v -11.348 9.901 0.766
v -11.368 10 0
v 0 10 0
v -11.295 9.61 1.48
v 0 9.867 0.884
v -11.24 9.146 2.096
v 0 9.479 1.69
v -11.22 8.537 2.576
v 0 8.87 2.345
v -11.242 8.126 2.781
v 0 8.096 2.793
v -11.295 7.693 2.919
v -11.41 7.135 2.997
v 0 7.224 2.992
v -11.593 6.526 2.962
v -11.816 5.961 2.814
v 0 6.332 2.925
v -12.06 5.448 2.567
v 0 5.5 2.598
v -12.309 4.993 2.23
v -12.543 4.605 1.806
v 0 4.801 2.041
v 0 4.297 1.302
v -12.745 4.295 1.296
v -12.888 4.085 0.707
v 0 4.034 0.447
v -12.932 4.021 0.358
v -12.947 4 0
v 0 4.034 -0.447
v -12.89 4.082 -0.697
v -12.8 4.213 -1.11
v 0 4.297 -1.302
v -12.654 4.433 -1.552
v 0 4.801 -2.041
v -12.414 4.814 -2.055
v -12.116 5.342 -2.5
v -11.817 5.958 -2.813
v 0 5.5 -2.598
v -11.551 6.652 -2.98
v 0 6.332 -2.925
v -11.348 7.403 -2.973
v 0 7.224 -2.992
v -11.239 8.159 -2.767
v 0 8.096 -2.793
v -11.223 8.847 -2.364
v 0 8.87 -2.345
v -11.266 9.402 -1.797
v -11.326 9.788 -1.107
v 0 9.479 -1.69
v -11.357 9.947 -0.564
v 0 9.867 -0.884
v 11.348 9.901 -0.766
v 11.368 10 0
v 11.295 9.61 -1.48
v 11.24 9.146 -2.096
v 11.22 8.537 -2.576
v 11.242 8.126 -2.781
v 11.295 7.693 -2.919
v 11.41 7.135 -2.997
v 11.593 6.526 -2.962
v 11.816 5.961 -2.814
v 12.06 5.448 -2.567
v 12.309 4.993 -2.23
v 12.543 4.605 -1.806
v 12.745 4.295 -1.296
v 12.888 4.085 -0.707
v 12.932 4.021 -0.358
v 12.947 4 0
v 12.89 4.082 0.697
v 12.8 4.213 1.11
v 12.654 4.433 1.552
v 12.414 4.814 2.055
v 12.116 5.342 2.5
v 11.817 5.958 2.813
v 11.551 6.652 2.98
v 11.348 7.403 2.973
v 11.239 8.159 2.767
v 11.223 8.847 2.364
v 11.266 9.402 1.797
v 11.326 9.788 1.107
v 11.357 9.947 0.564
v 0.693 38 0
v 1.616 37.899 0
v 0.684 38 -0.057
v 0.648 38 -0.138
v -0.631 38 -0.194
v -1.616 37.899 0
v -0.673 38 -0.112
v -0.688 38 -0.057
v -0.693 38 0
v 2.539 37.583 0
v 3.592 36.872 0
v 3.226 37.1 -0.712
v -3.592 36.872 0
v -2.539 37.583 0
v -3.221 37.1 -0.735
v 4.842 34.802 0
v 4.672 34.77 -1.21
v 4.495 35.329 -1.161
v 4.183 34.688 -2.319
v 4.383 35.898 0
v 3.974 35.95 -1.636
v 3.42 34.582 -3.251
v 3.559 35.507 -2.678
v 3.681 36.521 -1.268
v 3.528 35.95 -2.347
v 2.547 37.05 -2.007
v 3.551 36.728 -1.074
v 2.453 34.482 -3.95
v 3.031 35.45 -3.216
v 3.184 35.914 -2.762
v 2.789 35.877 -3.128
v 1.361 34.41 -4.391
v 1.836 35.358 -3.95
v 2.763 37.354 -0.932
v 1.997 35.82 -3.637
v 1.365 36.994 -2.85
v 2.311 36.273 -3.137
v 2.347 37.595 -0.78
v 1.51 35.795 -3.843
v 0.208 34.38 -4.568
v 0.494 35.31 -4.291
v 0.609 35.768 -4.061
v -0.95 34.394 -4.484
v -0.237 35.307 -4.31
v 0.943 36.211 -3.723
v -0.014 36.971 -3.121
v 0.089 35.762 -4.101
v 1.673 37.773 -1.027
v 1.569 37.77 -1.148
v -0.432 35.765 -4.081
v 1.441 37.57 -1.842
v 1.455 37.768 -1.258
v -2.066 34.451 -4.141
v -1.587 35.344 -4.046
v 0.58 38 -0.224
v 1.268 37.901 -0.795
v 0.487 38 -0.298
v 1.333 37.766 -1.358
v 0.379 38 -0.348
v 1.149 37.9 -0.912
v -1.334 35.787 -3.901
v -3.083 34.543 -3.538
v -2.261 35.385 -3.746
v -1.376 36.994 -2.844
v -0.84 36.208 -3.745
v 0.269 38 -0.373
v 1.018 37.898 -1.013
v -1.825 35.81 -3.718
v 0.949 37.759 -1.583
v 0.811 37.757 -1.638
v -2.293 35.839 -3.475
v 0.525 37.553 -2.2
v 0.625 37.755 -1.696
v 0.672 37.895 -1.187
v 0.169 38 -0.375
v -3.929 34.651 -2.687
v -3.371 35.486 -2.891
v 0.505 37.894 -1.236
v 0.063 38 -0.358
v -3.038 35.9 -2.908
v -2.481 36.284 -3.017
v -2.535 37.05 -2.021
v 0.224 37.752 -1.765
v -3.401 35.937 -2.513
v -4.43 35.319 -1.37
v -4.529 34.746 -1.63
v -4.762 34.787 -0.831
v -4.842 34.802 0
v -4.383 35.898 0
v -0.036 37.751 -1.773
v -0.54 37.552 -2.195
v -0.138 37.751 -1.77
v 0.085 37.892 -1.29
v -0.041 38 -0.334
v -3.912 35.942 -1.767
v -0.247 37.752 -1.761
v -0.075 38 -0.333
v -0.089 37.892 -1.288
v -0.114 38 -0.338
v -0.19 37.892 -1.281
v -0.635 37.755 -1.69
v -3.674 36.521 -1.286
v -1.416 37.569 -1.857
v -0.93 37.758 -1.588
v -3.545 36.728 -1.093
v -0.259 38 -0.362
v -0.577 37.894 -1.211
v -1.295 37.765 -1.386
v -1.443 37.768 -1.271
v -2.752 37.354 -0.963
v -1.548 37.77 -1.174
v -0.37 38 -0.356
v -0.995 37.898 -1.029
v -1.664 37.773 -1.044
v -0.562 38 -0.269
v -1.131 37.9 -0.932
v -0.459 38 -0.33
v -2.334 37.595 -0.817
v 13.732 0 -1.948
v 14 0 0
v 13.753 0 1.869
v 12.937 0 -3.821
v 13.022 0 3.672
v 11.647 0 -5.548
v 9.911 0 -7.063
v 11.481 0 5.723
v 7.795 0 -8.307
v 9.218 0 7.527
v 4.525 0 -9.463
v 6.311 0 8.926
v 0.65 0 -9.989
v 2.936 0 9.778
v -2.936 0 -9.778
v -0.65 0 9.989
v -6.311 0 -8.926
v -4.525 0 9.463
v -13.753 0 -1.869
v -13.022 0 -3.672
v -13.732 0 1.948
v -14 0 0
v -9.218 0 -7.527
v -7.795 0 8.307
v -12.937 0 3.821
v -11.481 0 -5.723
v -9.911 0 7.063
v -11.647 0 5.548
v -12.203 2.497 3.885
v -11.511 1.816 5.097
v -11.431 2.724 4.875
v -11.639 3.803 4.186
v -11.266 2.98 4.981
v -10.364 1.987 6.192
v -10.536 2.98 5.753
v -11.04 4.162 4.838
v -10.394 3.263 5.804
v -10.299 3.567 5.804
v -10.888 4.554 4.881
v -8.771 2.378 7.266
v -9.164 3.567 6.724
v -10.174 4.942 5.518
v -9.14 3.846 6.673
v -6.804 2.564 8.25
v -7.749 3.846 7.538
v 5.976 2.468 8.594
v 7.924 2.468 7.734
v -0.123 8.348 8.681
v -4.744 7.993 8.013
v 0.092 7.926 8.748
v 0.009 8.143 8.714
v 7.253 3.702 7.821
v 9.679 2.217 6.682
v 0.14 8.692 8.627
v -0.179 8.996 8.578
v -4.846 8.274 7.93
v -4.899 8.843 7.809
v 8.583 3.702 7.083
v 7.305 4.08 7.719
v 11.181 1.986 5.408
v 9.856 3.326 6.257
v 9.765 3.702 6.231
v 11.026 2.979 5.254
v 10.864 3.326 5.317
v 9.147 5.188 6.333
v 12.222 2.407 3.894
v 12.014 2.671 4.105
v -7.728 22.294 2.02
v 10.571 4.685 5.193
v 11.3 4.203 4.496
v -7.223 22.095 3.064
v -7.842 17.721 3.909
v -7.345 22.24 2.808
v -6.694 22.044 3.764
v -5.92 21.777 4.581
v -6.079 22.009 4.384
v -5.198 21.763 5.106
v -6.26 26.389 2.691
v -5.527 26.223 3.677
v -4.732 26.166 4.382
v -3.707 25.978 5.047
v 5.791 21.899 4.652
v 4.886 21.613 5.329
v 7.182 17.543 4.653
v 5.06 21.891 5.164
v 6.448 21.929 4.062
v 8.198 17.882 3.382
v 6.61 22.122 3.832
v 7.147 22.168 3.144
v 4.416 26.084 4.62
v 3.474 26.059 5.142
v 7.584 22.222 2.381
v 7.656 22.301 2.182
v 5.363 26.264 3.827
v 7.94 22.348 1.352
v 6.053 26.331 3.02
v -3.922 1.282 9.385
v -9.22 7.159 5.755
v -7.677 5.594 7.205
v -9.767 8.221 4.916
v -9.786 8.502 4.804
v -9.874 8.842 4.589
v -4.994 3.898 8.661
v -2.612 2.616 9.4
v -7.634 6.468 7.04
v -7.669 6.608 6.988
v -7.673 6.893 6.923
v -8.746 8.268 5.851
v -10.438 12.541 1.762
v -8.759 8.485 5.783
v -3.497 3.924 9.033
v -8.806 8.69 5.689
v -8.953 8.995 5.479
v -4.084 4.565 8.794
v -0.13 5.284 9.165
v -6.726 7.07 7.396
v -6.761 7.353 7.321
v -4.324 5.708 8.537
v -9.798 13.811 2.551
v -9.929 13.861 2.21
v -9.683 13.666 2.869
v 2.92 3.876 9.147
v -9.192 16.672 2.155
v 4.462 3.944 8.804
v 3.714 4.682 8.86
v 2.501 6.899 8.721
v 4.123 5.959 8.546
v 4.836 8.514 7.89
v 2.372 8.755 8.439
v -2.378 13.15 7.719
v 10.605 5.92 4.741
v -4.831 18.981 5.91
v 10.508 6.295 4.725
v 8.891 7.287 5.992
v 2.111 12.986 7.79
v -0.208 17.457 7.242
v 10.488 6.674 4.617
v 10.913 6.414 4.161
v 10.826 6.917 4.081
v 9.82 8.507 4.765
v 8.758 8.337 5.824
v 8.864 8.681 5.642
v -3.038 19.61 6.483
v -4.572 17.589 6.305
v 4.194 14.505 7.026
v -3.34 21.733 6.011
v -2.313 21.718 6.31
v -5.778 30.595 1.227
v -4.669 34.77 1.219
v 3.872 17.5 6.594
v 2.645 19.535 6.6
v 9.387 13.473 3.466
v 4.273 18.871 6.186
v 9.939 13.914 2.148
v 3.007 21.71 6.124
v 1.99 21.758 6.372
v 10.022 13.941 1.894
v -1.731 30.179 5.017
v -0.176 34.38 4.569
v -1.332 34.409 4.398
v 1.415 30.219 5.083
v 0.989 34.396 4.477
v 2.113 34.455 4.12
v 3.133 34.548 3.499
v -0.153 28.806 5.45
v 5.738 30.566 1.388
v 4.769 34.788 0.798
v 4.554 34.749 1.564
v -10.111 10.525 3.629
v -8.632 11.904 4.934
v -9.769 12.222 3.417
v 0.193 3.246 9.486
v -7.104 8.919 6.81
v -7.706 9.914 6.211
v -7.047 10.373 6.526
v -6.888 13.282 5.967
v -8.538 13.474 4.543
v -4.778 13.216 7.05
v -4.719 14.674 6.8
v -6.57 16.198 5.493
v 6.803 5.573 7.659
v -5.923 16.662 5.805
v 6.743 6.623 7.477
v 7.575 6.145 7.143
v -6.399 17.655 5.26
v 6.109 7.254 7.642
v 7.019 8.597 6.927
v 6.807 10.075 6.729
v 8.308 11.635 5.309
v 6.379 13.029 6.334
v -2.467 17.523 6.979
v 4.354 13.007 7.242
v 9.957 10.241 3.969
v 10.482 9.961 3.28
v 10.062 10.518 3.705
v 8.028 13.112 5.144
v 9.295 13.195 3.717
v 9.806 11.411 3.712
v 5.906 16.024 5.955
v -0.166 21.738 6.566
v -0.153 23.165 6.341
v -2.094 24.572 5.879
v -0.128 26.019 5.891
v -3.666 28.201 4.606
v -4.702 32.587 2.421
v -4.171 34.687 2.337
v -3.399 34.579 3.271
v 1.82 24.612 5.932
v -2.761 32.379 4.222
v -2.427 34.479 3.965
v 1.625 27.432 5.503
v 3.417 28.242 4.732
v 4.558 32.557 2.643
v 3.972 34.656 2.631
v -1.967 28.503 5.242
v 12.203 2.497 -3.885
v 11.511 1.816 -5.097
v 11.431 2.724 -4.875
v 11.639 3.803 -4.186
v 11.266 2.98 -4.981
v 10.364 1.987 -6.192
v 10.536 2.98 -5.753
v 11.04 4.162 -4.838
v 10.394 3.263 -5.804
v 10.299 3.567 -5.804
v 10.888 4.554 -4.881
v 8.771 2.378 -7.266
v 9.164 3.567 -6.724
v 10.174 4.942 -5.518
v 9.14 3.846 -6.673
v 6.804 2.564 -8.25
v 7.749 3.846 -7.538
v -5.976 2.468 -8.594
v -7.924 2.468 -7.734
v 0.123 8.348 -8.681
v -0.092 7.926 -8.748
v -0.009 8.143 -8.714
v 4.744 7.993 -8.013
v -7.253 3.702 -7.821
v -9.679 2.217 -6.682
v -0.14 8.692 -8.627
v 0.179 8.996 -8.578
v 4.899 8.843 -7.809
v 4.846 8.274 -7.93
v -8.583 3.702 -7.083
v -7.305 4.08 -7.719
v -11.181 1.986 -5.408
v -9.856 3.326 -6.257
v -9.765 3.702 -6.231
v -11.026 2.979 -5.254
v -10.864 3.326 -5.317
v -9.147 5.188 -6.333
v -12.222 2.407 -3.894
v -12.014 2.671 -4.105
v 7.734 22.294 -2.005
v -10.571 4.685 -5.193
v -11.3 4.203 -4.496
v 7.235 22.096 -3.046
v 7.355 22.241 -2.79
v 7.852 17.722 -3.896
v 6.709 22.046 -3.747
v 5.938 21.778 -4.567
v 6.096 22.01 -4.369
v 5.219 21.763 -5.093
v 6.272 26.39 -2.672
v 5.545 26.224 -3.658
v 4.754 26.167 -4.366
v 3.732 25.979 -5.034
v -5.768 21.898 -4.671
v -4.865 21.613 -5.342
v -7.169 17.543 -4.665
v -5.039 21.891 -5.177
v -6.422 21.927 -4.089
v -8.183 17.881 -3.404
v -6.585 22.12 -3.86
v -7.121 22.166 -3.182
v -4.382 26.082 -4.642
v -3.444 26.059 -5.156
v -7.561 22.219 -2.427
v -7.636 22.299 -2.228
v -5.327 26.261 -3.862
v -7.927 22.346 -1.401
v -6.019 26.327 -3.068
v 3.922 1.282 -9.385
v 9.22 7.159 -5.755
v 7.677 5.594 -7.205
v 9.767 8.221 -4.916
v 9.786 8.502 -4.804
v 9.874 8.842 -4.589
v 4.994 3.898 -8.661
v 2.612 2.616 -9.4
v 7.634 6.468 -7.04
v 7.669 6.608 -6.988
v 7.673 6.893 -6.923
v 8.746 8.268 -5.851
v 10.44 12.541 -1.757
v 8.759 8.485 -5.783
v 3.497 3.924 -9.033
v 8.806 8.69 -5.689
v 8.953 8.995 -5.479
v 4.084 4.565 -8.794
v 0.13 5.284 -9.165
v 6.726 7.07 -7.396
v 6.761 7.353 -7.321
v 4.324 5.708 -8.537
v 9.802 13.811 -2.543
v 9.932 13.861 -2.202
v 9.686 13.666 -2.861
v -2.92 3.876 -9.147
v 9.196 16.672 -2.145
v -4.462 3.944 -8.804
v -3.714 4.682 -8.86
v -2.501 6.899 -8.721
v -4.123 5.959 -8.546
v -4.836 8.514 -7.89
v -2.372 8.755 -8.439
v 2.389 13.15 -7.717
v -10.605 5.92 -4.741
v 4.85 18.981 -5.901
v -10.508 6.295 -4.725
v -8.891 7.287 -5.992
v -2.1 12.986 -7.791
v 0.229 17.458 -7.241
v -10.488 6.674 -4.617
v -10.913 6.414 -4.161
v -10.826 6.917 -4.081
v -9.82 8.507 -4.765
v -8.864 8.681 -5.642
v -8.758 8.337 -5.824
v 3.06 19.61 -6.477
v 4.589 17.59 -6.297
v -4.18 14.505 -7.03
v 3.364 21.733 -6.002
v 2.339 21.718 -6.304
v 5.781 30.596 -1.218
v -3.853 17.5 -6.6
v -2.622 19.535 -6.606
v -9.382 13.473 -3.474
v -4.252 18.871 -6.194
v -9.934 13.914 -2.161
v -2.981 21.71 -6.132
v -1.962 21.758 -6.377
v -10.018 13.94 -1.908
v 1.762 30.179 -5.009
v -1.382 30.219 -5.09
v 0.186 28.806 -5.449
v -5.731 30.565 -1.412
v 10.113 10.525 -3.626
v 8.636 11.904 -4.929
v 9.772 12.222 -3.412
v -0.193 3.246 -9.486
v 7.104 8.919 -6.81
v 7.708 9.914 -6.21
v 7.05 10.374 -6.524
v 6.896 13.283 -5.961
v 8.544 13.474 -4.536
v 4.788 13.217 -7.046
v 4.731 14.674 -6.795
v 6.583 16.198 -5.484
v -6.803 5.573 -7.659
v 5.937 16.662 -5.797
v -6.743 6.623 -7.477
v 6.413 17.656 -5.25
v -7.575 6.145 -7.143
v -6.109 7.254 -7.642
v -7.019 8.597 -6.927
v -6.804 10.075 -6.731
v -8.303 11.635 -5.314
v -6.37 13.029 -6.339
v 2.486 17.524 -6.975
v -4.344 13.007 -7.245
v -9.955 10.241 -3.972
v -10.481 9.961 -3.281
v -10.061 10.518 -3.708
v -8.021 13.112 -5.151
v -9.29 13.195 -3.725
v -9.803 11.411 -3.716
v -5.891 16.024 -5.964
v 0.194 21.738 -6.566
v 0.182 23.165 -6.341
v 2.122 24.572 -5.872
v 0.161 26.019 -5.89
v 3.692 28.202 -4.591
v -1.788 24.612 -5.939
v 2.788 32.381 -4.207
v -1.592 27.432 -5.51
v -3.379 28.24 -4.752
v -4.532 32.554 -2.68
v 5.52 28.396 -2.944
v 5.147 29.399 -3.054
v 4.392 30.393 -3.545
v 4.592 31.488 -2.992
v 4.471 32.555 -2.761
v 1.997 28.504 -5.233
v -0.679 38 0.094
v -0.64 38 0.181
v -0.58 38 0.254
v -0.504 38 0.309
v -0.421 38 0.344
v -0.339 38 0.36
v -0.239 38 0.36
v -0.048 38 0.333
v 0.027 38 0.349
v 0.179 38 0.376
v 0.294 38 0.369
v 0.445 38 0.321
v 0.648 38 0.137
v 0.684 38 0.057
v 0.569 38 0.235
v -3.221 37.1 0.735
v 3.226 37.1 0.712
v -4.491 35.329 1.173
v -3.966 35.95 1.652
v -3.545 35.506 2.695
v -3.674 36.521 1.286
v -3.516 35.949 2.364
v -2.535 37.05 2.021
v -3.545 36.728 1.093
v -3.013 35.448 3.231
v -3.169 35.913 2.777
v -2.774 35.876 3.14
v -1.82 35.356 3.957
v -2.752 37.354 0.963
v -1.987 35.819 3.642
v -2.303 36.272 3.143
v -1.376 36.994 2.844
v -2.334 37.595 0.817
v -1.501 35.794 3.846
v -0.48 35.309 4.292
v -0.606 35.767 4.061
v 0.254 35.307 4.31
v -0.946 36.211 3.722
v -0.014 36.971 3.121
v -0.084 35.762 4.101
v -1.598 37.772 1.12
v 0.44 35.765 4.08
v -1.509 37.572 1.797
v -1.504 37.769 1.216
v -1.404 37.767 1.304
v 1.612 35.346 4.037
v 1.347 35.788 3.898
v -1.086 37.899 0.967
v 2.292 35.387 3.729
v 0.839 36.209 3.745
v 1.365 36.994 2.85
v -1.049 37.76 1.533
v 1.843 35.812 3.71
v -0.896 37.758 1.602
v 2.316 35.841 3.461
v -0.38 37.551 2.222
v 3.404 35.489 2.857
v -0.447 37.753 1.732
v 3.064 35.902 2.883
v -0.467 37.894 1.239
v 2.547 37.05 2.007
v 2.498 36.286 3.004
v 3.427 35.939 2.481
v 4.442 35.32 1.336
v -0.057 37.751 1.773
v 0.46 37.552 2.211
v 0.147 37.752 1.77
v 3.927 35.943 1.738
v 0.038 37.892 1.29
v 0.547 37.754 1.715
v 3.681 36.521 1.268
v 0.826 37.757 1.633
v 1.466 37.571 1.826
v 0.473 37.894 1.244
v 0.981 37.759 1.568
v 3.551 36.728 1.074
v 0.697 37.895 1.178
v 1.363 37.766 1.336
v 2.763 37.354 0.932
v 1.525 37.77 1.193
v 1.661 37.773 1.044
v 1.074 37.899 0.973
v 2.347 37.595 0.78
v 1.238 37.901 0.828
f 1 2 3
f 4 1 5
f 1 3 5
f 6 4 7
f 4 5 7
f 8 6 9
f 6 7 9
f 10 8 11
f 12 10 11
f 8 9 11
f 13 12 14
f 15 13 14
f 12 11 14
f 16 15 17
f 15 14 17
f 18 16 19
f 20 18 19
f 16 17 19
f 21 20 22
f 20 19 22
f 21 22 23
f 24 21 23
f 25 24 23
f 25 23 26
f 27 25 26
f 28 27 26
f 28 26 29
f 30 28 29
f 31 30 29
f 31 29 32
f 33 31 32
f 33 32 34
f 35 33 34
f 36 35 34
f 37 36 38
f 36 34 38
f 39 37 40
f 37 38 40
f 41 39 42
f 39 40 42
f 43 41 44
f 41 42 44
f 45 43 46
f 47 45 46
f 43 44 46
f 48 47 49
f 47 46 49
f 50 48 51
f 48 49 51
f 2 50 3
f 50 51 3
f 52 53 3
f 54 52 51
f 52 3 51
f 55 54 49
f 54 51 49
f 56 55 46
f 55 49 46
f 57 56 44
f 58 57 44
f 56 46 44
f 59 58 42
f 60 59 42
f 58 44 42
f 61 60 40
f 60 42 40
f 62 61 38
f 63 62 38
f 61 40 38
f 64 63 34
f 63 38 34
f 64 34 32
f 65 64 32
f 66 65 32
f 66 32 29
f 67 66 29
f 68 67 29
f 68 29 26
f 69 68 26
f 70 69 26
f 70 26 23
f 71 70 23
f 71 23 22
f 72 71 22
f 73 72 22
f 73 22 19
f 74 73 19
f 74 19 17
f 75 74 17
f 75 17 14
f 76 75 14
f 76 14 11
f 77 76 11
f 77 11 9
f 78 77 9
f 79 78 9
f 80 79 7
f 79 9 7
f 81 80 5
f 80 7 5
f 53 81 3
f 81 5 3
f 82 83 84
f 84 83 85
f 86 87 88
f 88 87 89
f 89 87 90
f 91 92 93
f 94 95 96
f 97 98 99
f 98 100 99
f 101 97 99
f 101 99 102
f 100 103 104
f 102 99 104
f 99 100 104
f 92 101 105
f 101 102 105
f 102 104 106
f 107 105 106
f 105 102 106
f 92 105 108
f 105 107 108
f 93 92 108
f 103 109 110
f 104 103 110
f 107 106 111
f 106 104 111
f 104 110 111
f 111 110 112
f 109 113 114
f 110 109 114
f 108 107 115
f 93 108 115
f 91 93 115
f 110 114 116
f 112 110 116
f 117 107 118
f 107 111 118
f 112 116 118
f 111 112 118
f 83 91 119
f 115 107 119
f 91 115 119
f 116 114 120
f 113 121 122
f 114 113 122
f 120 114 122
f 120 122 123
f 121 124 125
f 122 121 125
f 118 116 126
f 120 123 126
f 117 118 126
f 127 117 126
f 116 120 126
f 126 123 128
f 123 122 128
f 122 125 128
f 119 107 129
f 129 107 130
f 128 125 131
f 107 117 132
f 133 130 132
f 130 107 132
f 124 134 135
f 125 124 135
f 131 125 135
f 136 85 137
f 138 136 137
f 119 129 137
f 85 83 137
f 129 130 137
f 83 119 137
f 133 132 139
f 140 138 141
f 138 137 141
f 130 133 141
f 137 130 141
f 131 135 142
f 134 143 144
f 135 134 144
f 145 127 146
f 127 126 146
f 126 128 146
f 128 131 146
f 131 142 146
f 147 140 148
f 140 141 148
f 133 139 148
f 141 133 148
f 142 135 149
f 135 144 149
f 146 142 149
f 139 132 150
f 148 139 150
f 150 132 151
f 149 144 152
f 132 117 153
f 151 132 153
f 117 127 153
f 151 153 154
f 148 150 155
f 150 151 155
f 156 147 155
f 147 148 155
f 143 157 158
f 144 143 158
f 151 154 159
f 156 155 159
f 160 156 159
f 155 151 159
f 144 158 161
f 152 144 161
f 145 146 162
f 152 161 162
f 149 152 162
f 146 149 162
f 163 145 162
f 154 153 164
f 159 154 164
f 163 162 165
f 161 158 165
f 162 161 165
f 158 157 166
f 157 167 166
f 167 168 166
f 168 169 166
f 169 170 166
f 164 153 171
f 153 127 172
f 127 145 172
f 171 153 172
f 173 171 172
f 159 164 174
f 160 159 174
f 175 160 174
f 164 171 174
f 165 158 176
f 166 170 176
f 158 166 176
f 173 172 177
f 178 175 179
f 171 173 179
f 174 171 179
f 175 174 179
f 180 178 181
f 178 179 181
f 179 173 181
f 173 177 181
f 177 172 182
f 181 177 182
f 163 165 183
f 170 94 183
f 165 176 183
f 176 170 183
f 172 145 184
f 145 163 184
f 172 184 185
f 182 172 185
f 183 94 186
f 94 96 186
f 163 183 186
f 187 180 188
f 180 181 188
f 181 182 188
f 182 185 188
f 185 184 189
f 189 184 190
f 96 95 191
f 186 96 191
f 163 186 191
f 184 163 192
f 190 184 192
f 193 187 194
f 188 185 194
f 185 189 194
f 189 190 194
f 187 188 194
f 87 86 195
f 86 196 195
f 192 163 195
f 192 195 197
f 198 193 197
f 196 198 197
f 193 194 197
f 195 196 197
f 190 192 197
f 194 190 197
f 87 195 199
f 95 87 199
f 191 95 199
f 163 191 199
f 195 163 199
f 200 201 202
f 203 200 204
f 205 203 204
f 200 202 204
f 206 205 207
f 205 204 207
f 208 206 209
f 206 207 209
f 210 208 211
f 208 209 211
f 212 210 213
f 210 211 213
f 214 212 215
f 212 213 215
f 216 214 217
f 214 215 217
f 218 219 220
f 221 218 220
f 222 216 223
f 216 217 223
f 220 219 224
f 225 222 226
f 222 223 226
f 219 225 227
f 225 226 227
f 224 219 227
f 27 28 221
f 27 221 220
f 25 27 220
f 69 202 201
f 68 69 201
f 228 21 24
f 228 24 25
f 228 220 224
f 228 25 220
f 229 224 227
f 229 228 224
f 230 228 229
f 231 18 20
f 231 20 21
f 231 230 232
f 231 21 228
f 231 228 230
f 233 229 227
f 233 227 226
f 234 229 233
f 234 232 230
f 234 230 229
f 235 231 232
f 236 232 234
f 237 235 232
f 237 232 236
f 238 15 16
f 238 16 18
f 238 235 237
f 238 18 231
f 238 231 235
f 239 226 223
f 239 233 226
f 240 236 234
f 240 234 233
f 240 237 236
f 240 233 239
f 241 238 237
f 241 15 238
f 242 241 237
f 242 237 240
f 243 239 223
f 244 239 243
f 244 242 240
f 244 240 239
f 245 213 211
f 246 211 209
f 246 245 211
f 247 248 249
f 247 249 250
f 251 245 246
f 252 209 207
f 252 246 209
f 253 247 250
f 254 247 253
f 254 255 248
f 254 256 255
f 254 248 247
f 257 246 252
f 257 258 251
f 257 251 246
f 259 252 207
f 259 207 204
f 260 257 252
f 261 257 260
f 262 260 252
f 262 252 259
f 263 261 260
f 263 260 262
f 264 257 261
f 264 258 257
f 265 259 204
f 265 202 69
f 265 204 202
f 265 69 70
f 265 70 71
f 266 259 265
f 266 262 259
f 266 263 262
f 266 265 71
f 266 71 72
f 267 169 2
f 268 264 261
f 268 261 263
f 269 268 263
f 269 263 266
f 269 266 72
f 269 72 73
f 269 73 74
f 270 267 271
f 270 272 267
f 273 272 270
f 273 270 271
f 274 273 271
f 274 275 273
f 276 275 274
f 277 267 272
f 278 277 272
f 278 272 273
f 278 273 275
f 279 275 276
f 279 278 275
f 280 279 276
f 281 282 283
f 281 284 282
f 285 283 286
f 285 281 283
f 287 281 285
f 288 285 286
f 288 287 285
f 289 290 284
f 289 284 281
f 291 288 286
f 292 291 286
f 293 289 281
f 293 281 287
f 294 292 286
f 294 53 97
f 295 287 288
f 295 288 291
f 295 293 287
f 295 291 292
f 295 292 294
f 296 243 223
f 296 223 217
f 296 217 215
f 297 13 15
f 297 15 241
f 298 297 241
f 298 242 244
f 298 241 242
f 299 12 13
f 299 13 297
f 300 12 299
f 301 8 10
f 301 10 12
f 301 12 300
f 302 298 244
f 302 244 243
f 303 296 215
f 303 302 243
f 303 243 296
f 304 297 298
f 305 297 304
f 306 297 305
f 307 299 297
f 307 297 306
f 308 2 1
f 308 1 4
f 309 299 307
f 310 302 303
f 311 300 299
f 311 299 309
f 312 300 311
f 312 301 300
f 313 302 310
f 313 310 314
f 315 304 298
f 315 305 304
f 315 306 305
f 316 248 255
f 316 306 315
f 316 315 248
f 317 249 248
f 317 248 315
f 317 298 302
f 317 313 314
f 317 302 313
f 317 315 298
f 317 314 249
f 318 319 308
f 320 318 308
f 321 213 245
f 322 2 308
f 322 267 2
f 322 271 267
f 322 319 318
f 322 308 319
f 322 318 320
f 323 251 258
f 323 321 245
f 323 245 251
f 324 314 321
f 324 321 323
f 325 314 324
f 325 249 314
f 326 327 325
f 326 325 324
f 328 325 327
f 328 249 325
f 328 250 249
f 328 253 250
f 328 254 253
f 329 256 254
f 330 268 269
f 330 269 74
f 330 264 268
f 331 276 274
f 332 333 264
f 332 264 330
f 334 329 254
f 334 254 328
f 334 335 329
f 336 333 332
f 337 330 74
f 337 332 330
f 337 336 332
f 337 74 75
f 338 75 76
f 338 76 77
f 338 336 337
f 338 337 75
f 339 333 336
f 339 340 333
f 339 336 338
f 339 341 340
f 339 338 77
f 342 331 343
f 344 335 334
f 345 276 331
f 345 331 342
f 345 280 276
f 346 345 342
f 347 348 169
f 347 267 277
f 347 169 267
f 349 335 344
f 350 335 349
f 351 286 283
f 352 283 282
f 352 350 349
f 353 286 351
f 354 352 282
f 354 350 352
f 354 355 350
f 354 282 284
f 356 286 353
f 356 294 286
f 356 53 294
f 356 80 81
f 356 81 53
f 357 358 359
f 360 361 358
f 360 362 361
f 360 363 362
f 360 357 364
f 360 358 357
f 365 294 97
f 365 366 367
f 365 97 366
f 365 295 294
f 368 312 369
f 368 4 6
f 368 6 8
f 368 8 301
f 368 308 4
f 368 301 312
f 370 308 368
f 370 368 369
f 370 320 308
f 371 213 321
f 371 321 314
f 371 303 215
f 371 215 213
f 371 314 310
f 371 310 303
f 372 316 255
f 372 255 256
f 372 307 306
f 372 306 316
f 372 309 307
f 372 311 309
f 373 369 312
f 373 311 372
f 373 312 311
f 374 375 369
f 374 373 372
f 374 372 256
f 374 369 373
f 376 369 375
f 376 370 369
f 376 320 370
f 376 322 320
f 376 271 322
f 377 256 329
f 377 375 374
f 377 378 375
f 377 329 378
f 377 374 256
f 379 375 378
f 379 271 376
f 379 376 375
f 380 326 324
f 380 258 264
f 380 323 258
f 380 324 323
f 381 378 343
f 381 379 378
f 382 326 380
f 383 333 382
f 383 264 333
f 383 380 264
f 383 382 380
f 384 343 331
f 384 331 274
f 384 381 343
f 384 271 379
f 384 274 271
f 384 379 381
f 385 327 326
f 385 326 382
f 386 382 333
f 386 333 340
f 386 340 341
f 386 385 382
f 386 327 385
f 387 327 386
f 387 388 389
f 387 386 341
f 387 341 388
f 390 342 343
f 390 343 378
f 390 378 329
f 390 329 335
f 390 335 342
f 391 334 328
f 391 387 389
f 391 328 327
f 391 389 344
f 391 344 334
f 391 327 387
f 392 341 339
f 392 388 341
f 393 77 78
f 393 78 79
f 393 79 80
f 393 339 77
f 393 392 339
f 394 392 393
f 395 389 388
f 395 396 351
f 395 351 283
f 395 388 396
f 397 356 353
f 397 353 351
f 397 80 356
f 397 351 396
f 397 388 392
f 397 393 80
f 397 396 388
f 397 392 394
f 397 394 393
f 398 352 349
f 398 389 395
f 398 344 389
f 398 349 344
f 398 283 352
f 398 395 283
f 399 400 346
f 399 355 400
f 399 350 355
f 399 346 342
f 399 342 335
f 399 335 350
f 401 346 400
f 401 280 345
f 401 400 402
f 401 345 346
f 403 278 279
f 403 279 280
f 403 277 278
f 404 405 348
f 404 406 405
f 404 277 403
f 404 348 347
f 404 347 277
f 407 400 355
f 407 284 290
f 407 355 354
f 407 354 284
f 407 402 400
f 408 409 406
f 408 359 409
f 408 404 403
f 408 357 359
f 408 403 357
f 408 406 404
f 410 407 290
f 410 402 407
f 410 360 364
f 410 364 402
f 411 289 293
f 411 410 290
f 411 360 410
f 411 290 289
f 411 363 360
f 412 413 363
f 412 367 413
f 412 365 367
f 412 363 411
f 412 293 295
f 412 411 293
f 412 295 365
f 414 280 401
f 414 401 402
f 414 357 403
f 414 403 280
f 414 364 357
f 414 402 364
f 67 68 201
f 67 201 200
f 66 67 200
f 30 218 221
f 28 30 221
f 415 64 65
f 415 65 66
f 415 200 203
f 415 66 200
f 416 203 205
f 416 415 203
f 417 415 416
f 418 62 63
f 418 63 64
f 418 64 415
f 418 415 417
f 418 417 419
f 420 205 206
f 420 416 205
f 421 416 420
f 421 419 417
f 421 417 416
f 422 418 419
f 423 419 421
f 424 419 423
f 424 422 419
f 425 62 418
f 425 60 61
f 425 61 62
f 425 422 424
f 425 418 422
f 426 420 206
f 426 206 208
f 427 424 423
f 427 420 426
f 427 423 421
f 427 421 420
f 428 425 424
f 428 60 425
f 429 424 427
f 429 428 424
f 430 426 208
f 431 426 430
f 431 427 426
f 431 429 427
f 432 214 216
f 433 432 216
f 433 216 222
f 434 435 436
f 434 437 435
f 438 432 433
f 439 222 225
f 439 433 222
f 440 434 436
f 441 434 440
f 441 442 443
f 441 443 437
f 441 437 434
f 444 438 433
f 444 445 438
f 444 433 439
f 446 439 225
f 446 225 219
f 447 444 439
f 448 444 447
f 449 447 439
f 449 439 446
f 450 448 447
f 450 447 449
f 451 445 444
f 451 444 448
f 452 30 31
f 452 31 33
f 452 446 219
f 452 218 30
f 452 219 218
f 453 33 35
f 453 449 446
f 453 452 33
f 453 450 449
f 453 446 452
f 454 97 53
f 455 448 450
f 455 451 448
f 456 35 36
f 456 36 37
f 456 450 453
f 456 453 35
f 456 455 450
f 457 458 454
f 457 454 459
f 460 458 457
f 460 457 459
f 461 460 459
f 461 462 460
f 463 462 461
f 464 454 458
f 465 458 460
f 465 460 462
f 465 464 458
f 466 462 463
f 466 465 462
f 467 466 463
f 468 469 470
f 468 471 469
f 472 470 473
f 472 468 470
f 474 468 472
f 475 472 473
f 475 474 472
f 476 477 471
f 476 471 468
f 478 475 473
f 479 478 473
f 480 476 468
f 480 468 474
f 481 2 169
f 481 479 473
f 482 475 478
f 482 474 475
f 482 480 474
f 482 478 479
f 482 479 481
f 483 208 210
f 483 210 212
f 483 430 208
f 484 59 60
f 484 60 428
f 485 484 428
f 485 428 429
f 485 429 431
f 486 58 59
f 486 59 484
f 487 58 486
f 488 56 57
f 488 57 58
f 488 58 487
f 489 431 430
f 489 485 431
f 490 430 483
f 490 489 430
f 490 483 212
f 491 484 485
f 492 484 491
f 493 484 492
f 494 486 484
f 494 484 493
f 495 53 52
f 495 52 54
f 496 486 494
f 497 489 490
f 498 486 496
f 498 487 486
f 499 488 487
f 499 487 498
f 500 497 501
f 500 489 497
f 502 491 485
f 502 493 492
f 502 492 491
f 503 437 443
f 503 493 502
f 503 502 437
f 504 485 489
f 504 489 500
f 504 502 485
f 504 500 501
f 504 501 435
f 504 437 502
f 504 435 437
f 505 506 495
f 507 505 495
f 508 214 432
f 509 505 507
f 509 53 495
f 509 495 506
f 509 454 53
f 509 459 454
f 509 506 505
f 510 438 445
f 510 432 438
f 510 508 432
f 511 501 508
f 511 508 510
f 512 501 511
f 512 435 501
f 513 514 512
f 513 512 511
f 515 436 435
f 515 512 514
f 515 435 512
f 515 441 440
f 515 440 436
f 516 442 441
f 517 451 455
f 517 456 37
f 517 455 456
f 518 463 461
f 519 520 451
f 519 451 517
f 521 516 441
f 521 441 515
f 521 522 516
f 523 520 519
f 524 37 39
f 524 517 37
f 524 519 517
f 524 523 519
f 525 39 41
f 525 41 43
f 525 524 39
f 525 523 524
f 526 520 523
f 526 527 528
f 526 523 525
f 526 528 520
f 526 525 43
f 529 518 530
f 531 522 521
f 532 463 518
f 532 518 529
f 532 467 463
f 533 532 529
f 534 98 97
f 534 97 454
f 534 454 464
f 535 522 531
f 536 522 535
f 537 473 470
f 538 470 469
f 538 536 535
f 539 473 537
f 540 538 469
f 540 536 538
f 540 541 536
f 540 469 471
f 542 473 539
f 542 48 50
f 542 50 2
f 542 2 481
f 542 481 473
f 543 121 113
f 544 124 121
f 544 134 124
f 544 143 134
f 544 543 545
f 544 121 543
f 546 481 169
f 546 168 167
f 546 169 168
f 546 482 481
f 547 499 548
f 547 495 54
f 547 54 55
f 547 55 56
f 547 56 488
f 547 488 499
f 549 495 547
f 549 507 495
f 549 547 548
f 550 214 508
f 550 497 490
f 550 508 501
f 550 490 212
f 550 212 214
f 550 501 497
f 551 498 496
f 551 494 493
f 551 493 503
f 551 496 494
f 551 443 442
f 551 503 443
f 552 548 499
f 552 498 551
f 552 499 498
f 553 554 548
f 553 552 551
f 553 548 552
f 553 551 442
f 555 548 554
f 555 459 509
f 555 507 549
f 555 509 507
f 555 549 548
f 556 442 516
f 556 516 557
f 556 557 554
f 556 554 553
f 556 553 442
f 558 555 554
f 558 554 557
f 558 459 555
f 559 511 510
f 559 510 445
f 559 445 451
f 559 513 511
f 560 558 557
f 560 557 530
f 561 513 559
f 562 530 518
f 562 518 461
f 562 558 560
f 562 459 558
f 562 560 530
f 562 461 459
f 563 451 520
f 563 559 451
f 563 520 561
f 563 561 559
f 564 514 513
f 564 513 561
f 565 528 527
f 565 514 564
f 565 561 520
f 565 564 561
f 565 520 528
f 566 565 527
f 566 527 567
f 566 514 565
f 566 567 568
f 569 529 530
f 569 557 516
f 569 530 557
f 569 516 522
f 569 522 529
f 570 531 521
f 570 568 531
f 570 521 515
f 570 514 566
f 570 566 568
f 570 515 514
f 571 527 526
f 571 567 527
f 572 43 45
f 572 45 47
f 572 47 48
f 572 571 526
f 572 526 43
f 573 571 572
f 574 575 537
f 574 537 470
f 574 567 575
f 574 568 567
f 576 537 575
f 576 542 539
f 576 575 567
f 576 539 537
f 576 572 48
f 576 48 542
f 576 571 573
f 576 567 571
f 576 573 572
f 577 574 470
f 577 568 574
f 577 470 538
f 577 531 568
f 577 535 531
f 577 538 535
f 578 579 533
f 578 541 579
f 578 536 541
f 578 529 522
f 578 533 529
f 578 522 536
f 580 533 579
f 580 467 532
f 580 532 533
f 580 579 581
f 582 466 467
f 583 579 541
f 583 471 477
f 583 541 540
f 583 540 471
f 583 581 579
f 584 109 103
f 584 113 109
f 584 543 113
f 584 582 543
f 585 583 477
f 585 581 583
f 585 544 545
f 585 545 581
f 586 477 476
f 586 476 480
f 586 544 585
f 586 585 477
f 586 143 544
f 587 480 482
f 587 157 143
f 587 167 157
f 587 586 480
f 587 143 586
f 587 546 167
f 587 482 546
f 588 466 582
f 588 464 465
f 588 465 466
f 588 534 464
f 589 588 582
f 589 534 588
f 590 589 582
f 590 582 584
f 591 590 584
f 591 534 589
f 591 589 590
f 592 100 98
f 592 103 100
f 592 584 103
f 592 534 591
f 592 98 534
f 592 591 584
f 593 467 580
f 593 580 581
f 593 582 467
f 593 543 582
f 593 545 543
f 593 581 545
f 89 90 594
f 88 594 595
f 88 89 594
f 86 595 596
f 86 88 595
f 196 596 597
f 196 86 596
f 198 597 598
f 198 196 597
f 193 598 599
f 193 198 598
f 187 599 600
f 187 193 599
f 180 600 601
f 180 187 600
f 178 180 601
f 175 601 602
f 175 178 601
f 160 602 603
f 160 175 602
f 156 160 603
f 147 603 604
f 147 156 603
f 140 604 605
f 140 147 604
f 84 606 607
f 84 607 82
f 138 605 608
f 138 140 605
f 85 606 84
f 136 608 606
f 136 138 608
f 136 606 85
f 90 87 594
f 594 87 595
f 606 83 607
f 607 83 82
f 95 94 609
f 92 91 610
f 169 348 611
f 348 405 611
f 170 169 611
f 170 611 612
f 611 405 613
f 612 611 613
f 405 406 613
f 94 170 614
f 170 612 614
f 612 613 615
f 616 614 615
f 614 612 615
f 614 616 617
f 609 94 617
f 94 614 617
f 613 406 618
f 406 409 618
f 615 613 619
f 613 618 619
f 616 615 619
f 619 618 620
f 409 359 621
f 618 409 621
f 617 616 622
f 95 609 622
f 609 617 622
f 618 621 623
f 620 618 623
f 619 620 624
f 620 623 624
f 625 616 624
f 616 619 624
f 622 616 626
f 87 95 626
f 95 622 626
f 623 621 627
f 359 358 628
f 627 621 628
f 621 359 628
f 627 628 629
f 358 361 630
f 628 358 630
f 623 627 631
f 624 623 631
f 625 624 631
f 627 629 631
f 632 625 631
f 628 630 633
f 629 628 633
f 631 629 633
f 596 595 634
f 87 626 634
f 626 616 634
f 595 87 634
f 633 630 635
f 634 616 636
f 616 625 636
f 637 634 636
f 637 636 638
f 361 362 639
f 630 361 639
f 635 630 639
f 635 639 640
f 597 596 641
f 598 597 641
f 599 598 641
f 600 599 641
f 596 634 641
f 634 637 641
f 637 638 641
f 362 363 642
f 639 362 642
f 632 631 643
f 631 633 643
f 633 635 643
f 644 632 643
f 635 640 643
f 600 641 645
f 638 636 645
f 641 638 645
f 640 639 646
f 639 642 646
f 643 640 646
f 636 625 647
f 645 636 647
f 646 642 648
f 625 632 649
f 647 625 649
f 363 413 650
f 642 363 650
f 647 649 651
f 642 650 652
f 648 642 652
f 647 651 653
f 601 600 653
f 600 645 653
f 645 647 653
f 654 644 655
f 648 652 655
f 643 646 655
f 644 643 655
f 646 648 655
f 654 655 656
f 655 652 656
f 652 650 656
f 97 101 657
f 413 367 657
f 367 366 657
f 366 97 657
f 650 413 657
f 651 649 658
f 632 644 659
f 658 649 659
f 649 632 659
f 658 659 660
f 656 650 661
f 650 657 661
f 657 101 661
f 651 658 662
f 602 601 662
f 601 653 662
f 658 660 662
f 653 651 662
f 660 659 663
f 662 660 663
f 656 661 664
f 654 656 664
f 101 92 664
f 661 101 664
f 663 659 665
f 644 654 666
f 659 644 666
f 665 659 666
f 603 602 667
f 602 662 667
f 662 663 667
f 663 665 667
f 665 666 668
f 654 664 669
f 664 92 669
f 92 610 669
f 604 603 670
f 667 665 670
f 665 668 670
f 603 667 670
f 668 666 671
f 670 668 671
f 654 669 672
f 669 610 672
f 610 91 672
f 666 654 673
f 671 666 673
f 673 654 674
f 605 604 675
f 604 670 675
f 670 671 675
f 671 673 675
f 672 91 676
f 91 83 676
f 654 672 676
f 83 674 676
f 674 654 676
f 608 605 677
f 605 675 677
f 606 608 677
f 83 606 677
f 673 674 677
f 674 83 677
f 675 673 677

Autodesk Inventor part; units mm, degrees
ref_plane "YZ Plane" through (0, 0, 0) normal (1, 0, 0) x (0, 1, 0)
ref_plane "XZ Plane" through (0, 0, 0) normal (0, 1, 0) x (-1, 0, 0)
ref_plane "XY Plane" through (0, 0, 0) normal (0, 0, 1) x (1, 0, 0)
sketch "Sketch1" plane through (0, 0, 0) normal (0, 1, 0) x (-1, 0, 0)
  ellipse E0 centre (0, 0) end of major axis (14, 0) minor radius 10
  dimension "d0" = 10
  dimension "d1" = 14
ref_plane "Work Plane4" through (0, 38, 0) normal (0, 1, 0) x (1, 0, 0)
sketch "Sketch8" plane through (0, 38, 0) normal (0, 1, 0) x (1, 0, 0)
  circle A0 centre (0, 0) radius 4
  dimension "d13" = 8
loft "Loft2" add profiles "Sketch1", "Sketch8"
fillet "Fillet3" radius 4.29 2 edges at (0, 38, 4) (0, 38, -4)
sketch "Sketch9" plane through (0, 0, 0) normal (1, 0, 0) x (0, 1, 0)
  line L0 (0, 0) -> (34.8018, 0) projected
  circle A0 centre (7, 0) radius 3
  dimension "d20" = 6
  dimension "d21" = 7
extrude "Extrusion2" cut sketch "Sketch9" along normal through all both and the other way through all
properties part number "landing"
